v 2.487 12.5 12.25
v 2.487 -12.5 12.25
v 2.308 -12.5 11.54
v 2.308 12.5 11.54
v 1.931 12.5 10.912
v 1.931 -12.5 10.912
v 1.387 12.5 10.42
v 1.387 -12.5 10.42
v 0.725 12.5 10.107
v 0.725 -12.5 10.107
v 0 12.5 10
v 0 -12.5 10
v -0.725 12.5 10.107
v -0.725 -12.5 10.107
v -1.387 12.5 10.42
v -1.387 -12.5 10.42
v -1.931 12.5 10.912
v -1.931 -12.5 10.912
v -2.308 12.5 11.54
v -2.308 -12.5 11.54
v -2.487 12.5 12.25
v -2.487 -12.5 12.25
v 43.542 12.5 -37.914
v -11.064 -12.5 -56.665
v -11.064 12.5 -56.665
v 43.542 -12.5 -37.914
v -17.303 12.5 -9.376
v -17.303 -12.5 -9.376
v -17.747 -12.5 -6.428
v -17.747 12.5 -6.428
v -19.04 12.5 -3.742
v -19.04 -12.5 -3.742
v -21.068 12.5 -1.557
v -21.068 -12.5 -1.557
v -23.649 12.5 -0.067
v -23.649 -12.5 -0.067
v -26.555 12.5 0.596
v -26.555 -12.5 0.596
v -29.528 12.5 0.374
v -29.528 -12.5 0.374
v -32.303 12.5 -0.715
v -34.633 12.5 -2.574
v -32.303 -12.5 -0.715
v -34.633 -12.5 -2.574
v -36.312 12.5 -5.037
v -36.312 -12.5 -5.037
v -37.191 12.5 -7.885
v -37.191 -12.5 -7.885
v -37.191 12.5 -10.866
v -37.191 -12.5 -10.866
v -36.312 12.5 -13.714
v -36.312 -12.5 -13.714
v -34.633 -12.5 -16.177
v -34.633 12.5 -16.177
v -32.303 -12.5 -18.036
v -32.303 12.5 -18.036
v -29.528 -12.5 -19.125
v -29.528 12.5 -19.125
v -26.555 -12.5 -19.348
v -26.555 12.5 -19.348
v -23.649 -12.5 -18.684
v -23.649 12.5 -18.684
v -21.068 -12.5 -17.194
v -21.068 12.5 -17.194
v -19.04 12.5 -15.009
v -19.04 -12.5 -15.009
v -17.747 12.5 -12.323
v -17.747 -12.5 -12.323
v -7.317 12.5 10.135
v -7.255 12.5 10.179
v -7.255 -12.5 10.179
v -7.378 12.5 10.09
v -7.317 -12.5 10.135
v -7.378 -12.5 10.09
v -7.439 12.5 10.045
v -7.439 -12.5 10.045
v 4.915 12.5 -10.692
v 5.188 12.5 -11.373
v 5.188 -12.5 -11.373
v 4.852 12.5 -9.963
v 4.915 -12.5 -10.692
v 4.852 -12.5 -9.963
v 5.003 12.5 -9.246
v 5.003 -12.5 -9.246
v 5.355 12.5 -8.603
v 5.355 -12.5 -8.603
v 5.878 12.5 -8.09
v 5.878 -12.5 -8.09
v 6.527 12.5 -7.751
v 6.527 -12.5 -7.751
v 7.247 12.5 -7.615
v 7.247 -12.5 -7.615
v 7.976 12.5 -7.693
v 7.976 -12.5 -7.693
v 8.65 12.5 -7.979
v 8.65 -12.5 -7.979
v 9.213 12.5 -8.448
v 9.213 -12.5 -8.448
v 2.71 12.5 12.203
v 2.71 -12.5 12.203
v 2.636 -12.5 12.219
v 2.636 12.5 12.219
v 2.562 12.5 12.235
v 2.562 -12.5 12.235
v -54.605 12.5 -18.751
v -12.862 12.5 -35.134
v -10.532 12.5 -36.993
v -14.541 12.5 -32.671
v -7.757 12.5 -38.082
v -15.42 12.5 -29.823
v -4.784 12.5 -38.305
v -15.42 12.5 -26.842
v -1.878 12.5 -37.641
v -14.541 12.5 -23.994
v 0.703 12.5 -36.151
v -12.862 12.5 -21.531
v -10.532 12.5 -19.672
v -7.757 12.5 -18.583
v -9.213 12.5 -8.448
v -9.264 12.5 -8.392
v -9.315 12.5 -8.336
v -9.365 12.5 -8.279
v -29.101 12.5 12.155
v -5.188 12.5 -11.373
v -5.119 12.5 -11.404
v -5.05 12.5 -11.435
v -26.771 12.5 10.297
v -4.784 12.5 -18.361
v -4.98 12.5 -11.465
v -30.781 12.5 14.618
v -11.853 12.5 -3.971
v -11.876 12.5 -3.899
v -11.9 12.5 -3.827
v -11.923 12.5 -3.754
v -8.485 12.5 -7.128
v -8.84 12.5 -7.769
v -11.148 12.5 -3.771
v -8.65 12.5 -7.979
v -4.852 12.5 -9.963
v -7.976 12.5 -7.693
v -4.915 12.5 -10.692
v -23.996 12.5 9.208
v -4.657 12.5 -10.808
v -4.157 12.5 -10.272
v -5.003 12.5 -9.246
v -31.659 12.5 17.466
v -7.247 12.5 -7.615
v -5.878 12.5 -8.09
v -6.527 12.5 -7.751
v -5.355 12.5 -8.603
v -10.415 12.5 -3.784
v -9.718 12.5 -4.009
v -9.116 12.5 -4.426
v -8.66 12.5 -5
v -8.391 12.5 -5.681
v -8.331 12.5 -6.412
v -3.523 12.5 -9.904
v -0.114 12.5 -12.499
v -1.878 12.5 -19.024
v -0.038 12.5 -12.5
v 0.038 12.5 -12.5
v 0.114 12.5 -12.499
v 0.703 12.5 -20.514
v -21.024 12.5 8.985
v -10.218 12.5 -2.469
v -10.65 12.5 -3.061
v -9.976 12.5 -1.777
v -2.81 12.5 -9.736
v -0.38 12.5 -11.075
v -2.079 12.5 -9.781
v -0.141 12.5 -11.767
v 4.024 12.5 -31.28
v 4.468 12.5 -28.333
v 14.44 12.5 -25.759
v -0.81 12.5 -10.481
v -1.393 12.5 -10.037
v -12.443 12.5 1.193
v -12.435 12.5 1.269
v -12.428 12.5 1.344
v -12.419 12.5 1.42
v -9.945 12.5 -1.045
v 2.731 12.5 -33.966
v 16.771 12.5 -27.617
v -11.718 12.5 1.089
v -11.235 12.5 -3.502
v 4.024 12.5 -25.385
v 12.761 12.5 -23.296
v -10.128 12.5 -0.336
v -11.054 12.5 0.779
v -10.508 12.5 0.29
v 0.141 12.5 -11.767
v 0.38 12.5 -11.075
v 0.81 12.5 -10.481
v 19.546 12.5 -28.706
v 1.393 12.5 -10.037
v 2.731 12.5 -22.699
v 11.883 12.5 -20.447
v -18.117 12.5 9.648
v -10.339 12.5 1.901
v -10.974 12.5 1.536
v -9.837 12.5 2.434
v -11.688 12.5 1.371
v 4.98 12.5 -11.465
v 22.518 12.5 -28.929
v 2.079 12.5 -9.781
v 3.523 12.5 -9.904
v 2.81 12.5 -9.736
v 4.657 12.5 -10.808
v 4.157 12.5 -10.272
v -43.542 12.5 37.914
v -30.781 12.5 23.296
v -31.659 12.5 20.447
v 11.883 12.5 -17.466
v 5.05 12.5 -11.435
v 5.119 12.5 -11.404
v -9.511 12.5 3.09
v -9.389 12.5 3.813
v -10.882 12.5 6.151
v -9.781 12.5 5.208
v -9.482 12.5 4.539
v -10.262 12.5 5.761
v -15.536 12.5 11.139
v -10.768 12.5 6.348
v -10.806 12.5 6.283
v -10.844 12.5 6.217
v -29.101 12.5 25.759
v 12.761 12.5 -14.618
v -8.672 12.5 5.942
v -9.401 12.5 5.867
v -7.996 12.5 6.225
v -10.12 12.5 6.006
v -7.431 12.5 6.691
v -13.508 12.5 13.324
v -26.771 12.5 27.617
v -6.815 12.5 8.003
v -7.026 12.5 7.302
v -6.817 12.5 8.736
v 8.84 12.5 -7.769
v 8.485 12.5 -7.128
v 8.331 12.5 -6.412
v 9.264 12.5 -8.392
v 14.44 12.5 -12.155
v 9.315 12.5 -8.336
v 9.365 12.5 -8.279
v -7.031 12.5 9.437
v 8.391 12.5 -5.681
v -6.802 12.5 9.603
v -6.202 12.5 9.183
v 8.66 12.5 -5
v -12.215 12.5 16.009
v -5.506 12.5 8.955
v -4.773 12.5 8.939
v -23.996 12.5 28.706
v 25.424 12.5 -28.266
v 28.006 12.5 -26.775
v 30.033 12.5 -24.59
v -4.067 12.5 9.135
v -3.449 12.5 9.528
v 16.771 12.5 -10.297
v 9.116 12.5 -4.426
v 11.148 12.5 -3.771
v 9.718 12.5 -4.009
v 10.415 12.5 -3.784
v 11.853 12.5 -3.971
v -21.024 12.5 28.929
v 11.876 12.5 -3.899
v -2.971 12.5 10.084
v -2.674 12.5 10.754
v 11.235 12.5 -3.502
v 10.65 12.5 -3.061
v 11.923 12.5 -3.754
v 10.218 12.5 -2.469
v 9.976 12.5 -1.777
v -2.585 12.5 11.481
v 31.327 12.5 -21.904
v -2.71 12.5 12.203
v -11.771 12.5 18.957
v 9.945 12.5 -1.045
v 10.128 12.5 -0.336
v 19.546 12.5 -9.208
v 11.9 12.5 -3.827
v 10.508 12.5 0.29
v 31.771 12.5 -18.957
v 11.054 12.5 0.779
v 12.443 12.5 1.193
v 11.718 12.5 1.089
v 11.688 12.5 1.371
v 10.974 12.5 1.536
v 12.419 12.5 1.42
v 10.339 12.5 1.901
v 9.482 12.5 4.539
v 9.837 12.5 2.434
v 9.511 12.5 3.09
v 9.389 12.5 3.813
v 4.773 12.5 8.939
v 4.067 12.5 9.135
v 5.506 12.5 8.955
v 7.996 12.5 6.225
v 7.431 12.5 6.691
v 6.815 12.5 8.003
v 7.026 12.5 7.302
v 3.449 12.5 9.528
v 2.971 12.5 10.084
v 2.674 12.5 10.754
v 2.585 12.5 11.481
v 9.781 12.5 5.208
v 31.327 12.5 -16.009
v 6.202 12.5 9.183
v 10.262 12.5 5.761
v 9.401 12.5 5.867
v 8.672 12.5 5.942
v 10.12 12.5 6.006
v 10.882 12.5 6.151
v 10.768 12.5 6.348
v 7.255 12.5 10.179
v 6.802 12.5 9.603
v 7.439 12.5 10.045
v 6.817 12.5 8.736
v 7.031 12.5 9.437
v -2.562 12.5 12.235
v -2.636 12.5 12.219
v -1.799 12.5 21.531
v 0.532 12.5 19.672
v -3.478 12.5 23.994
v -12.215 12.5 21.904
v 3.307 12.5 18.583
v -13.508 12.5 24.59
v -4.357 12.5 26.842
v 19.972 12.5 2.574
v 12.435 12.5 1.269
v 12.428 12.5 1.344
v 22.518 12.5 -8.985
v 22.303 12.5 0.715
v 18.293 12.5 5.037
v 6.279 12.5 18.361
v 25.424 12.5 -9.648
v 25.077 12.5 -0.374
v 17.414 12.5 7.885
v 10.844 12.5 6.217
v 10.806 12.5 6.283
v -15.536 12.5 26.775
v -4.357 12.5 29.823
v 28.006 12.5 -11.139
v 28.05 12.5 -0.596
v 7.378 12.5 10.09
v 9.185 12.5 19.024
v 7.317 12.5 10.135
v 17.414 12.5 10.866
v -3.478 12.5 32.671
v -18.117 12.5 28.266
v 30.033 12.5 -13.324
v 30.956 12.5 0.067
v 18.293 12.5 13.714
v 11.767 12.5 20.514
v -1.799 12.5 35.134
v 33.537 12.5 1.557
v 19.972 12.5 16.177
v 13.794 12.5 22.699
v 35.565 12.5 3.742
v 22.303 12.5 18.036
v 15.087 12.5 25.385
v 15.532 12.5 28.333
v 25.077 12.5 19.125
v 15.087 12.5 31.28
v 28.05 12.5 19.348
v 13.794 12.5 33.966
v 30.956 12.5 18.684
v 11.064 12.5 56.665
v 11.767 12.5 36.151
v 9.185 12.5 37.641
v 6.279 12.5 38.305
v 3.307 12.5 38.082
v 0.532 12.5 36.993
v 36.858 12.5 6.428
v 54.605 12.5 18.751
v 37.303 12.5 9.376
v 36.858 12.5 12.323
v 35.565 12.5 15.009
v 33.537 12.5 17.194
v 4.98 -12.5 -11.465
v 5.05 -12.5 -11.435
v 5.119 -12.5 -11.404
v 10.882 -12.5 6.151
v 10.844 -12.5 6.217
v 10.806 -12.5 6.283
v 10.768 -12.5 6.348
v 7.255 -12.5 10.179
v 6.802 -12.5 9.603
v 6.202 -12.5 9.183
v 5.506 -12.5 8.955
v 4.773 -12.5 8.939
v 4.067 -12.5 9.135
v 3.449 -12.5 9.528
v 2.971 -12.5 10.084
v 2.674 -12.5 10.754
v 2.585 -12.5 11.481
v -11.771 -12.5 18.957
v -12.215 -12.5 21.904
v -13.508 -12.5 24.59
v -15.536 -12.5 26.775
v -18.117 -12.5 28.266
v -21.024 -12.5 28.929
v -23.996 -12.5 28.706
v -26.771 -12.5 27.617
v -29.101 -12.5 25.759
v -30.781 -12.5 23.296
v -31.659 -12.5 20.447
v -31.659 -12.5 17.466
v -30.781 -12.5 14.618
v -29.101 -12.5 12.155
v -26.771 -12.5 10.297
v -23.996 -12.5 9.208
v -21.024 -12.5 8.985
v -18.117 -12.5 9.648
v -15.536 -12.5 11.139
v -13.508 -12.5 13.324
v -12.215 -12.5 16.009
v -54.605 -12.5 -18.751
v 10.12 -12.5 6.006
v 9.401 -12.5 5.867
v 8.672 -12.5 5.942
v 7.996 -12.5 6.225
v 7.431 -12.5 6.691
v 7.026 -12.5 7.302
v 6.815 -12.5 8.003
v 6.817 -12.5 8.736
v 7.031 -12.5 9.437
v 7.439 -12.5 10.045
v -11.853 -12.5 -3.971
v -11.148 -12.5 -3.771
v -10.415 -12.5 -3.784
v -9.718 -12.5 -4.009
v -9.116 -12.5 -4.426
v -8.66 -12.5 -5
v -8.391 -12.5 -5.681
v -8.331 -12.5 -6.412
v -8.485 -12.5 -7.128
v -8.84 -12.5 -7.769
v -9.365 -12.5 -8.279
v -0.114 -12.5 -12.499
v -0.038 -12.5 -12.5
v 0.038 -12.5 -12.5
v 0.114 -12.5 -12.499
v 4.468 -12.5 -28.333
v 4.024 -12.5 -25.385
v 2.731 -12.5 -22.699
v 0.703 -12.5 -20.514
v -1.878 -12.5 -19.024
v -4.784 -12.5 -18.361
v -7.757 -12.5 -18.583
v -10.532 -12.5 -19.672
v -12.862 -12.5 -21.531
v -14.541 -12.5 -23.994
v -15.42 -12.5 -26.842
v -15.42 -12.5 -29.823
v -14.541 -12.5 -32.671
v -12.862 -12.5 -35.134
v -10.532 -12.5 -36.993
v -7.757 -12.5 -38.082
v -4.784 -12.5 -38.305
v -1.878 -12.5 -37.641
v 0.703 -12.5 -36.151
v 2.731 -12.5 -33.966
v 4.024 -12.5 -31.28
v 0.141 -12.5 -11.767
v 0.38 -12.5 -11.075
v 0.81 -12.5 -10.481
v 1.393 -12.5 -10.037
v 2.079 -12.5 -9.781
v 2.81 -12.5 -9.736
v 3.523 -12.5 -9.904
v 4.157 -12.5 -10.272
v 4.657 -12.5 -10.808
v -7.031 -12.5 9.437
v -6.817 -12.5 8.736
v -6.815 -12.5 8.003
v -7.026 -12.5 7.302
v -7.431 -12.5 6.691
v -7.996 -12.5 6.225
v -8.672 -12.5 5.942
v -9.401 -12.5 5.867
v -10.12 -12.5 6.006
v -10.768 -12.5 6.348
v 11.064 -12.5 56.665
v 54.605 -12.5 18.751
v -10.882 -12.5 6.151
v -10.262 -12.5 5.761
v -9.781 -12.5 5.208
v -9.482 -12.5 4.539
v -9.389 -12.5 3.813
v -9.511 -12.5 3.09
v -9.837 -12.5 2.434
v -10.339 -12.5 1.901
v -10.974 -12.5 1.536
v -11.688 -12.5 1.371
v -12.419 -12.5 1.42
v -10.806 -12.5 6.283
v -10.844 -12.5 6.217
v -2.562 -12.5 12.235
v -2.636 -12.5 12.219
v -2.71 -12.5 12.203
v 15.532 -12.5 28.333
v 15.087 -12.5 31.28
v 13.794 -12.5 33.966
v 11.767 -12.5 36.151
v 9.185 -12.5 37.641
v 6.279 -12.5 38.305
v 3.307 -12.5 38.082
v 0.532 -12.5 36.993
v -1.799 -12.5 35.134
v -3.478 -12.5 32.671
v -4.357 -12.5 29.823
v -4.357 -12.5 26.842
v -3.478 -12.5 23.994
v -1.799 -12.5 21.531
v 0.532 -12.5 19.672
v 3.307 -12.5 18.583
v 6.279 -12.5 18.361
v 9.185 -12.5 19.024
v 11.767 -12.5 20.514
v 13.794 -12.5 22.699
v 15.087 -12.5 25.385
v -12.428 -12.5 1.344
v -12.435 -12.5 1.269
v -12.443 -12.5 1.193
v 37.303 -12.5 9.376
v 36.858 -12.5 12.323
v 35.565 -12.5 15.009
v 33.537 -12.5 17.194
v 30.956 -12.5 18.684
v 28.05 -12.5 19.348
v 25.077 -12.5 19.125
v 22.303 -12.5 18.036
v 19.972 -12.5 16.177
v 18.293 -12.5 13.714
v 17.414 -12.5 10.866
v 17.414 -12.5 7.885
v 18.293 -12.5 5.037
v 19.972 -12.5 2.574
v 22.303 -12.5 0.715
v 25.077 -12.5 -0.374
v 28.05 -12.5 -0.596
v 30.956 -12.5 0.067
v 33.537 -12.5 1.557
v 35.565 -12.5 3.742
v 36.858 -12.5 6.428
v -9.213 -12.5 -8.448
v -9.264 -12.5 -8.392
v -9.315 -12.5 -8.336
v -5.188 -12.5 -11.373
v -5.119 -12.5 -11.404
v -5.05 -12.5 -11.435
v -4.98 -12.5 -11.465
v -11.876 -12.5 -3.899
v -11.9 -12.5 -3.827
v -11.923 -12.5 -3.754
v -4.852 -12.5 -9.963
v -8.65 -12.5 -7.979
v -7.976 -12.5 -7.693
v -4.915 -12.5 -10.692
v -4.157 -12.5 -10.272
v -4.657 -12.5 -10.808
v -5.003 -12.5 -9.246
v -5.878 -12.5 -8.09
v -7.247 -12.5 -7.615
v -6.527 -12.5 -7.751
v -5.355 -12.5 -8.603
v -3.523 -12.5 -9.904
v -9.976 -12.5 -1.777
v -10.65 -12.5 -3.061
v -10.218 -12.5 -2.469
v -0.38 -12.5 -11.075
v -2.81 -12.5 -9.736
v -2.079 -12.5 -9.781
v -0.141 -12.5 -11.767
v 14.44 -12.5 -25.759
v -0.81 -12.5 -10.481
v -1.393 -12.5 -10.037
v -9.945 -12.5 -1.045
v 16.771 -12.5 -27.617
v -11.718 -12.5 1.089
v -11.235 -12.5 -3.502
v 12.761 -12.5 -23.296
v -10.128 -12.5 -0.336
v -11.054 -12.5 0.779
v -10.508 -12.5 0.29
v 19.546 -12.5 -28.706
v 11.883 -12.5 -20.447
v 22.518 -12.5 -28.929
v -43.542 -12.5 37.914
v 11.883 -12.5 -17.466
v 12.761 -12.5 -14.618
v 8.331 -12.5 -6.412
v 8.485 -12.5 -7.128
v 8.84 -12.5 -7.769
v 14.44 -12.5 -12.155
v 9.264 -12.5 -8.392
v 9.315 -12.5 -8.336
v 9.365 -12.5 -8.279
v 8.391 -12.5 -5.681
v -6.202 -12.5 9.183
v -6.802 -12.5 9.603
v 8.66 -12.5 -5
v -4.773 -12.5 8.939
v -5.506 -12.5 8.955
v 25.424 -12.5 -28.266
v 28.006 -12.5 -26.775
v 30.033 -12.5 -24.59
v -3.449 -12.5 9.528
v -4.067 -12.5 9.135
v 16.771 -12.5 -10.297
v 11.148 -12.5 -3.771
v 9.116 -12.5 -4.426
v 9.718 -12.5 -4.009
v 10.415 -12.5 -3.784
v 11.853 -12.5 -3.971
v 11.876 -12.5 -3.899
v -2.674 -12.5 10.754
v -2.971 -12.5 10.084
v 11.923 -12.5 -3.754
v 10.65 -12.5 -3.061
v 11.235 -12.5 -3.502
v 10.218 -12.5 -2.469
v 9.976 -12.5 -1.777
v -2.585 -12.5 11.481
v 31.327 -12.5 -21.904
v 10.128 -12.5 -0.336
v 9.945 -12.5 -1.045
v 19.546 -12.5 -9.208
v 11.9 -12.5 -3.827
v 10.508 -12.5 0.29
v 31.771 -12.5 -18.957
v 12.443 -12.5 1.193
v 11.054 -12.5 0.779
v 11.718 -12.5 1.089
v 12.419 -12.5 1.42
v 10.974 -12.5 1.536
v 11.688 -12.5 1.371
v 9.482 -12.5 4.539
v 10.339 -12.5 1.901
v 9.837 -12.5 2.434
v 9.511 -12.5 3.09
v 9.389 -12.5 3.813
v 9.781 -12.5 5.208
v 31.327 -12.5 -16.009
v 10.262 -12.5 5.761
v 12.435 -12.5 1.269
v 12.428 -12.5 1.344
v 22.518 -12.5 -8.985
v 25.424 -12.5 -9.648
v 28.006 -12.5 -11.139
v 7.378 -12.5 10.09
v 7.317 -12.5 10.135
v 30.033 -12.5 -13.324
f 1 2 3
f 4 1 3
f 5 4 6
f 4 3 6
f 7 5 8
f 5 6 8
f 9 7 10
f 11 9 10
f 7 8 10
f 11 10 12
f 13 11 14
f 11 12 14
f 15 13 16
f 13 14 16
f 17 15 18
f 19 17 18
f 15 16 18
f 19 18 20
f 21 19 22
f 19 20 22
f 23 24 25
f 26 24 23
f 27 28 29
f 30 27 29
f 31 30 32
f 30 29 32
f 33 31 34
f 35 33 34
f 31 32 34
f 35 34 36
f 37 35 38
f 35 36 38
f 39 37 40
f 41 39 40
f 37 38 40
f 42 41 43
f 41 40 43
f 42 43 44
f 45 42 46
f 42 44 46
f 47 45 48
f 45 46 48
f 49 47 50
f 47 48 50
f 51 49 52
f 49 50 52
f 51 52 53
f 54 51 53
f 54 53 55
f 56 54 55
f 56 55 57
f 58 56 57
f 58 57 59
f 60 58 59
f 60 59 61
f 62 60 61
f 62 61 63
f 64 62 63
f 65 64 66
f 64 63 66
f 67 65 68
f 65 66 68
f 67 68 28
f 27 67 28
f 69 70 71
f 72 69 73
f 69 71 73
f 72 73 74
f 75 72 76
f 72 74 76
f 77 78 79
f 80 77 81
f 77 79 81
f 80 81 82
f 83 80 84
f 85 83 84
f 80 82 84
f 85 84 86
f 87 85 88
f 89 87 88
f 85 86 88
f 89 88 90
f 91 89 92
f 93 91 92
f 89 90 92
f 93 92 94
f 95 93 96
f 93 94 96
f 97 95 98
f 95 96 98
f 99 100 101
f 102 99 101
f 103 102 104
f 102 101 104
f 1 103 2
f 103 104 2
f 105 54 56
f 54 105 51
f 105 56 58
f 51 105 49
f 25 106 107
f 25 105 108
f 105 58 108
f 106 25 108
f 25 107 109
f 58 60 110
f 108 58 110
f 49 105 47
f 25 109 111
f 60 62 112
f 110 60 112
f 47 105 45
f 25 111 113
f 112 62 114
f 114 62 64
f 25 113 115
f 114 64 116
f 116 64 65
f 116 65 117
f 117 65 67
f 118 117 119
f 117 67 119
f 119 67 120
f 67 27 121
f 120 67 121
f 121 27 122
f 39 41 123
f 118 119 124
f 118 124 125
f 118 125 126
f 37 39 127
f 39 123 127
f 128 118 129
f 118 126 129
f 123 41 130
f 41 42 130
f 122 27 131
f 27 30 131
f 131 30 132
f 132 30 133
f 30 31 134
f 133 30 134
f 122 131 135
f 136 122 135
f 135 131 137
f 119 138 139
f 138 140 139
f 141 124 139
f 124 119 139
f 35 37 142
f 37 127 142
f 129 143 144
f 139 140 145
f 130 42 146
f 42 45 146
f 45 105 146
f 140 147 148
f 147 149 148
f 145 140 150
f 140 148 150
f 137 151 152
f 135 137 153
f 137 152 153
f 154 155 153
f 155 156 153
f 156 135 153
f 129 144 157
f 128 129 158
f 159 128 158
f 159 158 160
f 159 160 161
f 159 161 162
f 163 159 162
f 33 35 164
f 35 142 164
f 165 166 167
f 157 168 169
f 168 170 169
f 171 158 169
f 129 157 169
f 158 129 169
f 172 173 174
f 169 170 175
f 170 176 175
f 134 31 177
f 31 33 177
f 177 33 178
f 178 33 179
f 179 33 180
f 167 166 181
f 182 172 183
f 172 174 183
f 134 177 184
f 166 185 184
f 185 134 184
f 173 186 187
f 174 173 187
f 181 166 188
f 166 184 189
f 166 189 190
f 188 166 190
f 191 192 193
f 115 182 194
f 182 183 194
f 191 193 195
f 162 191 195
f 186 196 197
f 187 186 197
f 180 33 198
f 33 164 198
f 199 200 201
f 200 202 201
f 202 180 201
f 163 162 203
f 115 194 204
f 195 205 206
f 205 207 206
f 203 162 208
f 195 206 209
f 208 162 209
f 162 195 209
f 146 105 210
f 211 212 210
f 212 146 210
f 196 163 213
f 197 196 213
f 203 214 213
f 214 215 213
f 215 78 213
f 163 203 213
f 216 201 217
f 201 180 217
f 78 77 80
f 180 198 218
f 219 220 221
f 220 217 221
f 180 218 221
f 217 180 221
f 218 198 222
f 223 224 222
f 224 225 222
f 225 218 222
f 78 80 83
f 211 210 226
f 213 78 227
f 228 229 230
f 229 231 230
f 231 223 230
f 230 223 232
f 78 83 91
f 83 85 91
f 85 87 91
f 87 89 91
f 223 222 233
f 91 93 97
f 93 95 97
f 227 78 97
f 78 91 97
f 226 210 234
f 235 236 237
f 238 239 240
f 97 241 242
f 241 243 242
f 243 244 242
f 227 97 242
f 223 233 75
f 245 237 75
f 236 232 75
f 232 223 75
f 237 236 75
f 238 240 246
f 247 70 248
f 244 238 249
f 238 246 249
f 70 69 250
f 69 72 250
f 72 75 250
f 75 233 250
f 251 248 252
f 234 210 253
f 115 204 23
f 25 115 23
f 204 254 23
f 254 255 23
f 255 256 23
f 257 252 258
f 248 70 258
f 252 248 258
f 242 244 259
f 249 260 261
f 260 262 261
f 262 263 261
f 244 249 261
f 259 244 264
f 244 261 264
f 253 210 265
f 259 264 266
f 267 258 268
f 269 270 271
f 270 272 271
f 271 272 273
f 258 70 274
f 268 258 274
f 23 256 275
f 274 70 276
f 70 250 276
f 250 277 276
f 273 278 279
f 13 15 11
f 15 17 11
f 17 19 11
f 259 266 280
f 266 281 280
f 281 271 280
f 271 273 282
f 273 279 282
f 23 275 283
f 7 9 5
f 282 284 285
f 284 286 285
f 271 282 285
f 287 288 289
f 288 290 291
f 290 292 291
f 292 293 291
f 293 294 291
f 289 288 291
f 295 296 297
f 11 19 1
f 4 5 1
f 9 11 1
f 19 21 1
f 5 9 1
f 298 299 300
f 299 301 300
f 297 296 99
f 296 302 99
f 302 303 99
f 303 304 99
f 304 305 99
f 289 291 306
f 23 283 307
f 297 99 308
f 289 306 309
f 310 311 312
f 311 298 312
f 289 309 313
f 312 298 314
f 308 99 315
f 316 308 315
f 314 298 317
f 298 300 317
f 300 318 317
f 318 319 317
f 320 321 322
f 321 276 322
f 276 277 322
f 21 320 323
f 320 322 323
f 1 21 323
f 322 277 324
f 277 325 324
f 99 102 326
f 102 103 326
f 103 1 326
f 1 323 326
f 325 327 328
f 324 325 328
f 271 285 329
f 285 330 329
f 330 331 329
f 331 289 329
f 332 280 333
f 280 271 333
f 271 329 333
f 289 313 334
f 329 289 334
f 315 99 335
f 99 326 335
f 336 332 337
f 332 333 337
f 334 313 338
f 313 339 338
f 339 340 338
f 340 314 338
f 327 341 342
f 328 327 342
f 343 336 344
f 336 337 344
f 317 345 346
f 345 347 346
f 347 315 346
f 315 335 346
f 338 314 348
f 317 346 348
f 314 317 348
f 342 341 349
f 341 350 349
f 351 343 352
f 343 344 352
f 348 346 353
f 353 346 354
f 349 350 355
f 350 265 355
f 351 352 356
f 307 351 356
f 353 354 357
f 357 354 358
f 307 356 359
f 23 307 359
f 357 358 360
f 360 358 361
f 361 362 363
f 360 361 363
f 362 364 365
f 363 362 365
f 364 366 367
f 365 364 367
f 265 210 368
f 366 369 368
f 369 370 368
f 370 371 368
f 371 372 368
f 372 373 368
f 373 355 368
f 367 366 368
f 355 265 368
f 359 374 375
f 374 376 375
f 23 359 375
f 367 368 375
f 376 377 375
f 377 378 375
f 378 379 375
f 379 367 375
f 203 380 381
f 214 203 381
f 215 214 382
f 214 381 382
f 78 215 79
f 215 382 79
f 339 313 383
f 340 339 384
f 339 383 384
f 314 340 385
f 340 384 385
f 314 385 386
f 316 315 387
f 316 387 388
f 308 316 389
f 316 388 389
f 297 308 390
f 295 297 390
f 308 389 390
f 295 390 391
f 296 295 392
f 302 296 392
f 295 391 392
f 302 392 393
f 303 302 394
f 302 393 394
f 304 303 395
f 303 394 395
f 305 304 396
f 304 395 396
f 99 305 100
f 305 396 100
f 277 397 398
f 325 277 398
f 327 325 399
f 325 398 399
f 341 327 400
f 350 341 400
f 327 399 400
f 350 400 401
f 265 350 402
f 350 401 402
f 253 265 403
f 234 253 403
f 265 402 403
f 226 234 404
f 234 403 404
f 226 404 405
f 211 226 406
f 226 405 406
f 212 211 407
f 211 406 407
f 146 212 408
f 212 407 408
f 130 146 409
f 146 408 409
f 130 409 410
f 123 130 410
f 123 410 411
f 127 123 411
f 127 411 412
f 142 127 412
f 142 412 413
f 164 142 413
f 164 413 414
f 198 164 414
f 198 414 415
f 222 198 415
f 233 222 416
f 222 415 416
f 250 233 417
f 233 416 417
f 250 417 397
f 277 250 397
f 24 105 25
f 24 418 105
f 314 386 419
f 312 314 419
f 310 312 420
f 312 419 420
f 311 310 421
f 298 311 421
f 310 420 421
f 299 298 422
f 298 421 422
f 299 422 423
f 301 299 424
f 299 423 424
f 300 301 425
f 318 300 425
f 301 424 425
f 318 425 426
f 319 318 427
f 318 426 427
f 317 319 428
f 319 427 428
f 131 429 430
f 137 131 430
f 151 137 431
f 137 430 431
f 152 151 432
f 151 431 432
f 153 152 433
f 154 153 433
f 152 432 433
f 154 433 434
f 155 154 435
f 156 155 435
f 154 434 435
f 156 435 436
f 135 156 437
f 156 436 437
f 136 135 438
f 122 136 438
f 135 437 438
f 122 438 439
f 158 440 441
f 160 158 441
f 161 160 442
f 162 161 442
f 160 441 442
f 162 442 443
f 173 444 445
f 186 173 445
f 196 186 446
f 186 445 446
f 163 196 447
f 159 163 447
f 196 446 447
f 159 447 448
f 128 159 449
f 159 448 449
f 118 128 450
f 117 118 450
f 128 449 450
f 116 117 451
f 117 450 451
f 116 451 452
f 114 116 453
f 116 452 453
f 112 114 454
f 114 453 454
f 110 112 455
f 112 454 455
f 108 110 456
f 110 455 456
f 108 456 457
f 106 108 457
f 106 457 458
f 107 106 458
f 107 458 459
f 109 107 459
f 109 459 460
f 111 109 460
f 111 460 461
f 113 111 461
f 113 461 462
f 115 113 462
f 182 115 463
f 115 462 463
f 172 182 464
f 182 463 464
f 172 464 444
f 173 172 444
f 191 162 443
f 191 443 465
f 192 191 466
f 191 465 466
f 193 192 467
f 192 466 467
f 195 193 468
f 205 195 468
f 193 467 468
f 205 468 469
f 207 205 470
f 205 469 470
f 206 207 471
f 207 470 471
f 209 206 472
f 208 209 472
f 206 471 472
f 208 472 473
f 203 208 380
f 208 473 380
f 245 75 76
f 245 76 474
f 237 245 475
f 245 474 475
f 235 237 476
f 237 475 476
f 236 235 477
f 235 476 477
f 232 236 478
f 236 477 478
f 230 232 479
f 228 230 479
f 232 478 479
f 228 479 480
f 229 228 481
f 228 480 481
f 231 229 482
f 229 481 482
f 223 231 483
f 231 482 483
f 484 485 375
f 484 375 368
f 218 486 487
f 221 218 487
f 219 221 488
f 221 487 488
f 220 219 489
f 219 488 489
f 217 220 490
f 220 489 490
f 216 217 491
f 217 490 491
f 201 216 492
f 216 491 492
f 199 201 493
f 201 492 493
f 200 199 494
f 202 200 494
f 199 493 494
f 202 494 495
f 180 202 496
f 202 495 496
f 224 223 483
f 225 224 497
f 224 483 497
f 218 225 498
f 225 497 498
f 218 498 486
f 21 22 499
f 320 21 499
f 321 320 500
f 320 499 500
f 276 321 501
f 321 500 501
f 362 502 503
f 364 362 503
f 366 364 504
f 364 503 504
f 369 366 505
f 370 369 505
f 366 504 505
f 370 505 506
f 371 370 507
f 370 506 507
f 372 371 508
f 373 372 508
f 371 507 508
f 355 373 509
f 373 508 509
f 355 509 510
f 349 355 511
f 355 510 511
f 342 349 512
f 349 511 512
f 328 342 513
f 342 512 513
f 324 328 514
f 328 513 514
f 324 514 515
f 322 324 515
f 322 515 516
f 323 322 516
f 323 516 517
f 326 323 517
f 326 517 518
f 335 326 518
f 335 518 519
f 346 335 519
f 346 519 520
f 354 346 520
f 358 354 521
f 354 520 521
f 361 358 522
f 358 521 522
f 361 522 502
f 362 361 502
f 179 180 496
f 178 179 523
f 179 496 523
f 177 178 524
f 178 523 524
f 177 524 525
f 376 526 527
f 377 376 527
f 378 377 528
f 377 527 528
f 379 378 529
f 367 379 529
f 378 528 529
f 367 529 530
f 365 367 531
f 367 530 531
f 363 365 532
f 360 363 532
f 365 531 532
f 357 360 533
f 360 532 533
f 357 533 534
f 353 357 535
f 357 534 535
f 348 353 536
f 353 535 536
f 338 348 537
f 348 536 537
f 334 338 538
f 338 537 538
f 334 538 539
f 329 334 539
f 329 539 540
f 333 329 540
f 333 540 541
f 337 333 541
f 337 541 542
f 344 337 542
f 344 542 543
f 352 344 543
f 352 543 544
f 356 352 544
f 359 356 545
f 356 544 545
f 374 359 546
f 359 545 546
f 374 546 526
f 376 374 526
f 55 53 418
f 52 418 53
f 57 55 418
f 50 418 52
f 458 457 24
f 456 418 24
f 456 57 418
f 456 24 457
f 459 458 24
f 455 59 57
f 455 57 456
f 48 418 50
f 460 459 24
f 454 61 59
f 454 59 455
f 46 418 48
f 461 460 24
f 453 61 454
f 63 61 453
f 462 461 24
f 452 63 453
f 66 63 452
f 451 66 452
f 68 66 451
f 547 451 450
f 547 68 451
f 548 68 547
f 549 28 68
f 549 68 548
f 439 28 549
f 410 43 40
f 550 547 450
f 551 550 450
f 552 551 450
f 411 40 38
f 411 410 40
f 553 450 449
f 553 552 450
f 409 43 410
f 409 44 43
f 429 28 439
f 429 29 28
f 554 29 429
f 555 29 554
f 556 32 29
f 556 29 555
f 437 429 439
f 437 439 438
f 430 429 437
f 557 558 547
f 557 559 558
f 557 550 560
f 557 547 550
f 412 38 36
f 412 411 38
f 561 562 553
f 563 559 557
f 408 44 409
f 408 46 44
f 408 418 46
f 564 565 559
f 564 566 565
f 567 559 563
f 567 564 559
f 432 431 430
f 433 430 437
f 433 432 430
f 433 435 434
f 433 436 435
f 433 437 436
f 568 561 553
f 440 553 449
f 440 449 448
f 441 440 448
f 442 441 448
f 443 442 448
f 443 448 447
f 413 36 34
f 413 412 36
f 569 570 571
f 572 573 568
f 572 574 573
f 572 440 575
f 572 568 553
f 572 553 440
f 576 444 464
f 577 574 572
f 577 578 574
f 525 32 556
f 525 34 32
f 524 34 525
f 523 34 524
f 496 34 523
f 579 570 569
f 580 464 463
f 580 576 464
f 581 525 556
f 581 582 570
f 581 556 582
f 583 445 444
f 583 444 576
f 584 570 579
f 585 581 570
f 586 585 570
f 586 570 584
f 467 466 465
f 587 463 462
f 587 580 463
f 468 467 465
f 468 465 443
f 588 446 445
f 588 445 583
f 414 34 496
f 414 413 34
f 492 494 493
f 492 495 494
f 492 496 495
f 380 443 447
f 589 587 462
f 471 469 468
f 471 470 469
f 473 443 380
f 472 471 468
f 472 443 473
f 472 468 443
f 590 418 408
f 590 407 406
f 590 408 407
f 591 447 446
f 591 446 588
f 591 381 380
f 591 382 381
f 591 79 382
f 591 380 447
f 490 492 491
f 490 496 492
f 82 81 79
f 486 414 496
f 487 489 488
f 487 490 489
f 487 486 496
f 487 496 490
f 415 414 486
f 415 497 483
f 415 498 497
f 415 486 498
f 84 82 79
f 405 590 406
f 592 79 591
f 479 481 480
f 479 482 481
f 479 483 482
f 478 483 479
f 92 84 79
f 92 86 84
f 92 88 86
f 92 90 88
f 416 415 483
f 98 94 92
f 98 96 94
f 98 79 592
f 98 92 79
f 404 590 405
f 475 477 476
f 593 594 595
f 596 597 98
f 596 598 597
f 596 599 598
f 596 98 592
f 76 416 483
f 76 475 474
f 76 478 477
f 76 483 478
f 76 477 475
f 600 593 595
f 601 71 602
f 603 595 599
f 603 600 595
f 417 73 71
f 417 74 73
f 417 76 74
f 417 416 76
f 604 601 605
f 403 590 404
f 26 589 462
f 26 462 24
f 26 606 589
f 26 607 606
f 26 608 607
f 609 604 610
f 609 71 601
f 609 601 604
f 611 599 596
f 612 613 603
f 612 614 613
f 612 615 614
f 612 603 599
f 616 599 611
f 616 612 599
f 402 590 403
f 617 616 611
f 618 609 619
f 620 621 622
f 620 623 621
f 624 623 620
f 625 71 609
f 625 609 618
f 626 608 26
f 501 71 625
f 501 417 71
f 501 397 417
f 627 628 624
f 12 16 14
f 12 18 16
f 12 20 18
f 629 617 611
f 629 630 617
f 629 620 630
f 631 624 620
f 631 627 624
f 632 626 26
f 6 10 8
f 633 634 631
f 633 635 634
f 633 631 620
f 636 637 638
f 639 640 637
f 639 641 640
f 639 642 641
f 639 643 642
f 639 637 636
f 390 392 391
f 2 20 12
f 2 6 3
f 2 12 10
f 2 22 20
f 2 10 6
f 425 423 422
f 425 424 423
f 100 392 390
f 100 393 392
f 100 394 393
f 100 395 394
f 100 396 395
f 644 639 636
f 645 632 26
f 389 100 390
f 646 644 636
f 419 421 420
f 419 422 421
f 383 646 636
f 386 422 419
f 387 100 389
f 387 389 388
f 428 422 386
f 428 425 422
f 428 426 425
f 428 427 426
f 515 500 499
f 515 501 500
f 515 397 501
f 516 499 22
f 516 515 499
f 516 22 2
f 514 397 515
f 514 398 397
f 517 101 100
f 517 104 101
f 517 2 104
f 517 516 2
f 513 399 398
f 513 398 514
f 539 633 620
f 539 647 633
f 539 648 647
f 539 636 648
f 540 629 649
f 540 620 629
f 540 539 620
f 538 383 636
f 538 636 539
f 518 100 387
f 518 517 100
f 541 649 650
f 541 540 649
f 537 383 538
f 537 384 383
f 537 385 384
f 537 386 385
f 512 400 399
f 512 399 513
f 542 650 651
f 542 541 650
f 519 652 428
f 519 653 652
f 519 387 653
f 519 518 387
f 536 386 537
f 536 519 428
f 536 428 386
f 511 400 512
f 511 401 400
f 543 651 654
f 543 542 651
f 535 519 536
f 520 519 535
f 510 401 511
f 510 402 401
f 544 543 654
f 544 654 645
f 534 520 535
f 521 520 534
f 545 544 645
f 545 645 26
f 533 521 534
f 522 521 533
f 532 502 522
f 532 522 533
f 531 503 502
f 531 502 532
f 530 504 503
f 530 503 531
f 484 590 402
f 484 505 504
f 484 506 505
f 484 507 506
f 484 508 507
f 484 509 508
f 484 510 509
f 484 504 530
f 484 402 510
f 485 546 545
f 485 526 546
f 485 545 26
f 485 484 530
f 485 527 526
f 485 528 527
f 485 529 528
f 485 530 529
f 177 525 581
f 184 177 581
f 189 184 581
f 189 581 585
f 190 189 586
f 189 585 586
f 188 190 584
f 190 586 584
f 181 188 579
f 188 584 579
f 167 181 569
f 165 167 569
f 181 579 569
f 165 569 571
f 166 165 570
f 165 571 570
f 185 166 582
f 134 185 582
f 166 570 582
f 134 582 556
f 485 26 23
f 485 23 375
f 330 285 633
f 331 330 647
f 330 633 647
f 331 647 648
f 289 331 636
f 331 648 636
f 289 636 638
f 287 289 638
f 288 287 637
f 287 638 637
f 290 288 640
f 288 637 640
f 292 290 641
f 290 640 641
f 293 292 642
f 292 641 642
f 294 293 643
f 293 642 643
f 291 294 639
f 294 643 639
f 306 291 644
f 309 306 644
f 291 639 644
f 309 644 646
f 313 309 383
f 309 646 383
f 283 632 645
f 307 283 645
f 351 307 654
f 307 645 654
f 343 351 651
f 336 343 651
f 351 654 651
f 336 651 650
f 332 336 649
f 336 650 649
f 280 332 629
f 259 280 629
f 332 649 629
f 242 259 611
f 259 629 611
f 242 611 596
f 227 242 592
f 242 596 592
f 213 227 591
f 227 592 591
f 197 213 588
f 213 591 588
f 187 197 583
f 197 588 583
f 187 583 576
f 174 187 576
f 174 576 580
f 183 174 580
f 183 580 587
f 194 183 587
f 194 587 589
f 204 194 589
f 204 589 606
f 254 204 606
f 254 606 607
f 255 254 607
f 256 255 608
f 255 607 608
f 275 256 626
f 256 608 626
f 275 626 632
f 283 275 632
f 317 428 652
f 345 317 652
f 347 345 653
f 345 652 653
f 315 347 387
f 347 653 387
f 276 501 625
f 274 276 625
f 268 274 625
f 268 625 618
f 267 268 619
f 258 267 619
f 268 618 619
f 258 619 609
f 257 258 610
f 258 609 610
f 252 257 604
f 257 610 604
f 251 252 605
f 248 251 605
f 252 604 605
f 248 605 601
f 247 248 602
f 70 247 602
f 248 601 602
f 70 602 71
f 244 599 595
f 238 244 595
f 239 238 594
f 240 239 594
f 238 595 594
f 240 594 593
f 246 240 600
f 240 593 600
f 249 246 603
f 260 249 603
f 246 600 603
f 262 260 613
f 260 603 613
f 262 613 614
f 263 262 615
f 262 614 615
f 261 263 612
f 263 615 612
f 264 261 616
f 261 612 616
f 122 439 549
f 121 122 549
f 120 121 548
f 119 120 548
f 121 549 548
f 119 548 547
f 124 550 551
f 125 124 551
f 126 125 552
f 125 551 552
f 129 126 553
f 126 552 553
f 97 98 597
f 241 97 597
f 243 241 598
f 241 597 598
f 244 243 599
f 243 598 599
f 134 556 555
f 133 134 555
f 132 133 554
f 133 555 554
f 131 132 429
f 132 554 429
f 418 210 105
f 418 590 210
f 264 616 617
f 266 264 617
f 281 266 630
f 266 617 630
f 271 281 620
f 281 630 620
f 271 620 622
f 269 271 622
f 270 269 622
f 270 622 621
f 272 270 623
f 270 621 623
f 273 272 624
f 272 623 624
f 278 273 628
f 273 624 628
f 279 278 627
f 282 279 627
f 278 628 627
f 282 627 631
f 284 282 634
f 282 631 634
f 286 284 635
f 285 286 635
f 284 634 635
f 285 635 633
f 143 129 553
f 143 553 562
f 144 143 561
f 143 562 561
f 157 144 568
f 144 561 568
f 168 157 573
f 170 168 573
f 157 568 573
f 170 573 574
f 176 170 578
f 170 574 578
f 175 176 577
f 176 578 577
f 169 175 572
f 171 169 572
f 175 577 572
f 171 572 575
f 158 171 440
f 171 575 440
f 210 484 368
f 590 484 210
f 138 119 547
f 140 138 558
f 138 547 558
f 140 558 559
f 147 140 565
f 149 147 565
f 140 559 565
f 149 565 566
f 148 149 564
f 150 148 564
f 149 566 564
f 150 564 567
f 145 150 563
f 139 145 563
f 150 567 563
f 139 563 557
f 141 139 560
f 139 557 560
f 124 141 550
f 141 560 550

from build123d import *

# Parameters (mm, degrees)
F1_DEPTH = 12.5
F2_R     = 10
F3_DEPTH = 25
F5_DEPTH = 25


with BuildPart() as f1:
    # F0 (on Front) → F1 (new body, symmetric)
    with BuildSketch(Plane.XZ):
        Polygon((-54.605159, -18.751266), (-11.063506, -56.665088), (43.541652, -37.913821), (54.605159, 18.751266), (11.063506, 56.665088), (-43.541652, 37.913821), align=None)
    extrude(amount=F1_DEPTH, both=True)

    # F2 (on face) → F3 (cut)
    with BuildSketch(Plane.XZ.offset(12.5)):
        with Locations((5.531753, 28.332544)):
            Circle(F2_R)
        with Locations((27.302579, 9.375633)):
            Circle(F2_R)
        with Locations((21.770826, -18.956911)):
            Circle(F2_R)
        with Locations((-5.531753, -28.332544)):
            Circle(F2_R)
        with Locations((-27.302579, -9.375633)):
            Circle(F2_R)
        with Locations((-21.770826, 18.956911)):
            Circle(F2_R)
    extrude(amount=-F3_DEPTH, mode=Mode.SUBTRACT)

    # F4 (on face) → F5 (cut)
    with BuildSketch(Plane.XZ.offset(12.5)):
        with BuildLine():
            ThreePointArc((2.487469, 12.25), (0, 10), (-2.487469, 12.25))
            ThreePointArc((-2.487469, 12.25), (-2.598896, 12.226845), (-2.710108, 12.202676))
            ThreePointArc((-2.710108, 12.202676), (-4.067366, 9.135455), (-7.254939, 10.179187))
            ThreePointArc((-7.254939, 10.179187), (-7.347316, 10.112712), (-7.439083, 10.045399))
            ThreePointArc((-7.439083, 10.045399), (-7.431448, 6.691306), (-10.767965, 6.348301))
            ThreePointArc((-10.767965, 6.348301), (-10.825318, 6.25), (-10.881772, 6.151181))
            ThreePointArc((-10.881772, 6.151181), (-9.510565, 3.09017), (-12.419112, 1.419735))
            ThreePointArc((-12.419112, 1.419735), (-12.431524, 1.306606), (-12.442904, 1.193368))
            ThreePointArc((-12.442904, 1.193368), (-9.945219, -1.045285), (-11.922882, -3.754316))
            ThreePointArc((-11.922882, -3.754316), (-11.888206, -3.862712), (-11.852546, -3.970789))
            ThreePointArc((-11.852546, -3.970789), (-8.660254, -5), (-9.365077, -8.279211))
            ThreePointArc((-9.365077, -8.279211), (-9.28931, -8.364133), (-9.212774, -8.448361))
            ThreePointArc((-9.212774, -8.448361), (-5.877853, -8.09017), (-5.187965, -11.372556))
            ThreePointArc((-5.187965, -11.372556), (-5.084208, -11.419318), (-4.98003, -11.465134))
            ThreePointArc((-4.98003, -11.465134), (-2.079117, -9.781476), (-0.113807, -12.499482))
            ThreePointArc((-0.113807, -12.499482), (0, -12.5), (0.113807, -12.499482))
            ThreePointArc((0.113807, -12.499482), (2.079117, -9.781476), (4.98003, -11.465134))
            ThreePointArc((4.98003, -11.465134), (5.084208, -11.419318), (5.187965, -11.372556))
            ThreePointArc((5.187965, -11.372556), (5.877853, -8.09017), (9.212774, -8.448361))
            ThreePointArc((9.212774, -8.448361), (9.28931, -8.364133), (9.365077, -8.279211))
            ThreePointArc((9.365077, -8.279211), (8.660254, -5), (11.852545, -3.970789))
            ThreePointArc((11.852545, -3.970789), (11.888206, -3.862712), (11.922882, -3.754316))
            ThreePointArc((11.922882, -3.754316), (9.945219, -1.045285), (12.442904, 1.193368))
            ThreePointArc((12.442904, 1.193368), (12.431524, 1.306606), (12.419112, 1.419735))
            ThreePointArc((12.419112, 1.419735), (9.510565, 3.09017), (10.881772, 6.151181))
            ThreePointArc((10.881772, 6.151181), (10.825318, 6.25), (10.767965, 6.348301))
            ThreePointArc((10.767965, 6.348301), (7.431448, 6.691306), (7.439083, 10.045399))
            ThreePointArc((7.439083, 10.045399), (7.347316, 10.112712), (7.25494, 10.179187))
            ThreePointArc((7.25494, 10.179187), (4.067366, 9.135455), (2.710108, 12.202676))
            ThreePointArc((2.710108, 12.202676), (2.598896, 12.226845), (2.487469, 12.25))
        make_face()
    extrude(amount=-F5_DEPTH, mode=Mode.SUBTRACT)


solid = f1.part
